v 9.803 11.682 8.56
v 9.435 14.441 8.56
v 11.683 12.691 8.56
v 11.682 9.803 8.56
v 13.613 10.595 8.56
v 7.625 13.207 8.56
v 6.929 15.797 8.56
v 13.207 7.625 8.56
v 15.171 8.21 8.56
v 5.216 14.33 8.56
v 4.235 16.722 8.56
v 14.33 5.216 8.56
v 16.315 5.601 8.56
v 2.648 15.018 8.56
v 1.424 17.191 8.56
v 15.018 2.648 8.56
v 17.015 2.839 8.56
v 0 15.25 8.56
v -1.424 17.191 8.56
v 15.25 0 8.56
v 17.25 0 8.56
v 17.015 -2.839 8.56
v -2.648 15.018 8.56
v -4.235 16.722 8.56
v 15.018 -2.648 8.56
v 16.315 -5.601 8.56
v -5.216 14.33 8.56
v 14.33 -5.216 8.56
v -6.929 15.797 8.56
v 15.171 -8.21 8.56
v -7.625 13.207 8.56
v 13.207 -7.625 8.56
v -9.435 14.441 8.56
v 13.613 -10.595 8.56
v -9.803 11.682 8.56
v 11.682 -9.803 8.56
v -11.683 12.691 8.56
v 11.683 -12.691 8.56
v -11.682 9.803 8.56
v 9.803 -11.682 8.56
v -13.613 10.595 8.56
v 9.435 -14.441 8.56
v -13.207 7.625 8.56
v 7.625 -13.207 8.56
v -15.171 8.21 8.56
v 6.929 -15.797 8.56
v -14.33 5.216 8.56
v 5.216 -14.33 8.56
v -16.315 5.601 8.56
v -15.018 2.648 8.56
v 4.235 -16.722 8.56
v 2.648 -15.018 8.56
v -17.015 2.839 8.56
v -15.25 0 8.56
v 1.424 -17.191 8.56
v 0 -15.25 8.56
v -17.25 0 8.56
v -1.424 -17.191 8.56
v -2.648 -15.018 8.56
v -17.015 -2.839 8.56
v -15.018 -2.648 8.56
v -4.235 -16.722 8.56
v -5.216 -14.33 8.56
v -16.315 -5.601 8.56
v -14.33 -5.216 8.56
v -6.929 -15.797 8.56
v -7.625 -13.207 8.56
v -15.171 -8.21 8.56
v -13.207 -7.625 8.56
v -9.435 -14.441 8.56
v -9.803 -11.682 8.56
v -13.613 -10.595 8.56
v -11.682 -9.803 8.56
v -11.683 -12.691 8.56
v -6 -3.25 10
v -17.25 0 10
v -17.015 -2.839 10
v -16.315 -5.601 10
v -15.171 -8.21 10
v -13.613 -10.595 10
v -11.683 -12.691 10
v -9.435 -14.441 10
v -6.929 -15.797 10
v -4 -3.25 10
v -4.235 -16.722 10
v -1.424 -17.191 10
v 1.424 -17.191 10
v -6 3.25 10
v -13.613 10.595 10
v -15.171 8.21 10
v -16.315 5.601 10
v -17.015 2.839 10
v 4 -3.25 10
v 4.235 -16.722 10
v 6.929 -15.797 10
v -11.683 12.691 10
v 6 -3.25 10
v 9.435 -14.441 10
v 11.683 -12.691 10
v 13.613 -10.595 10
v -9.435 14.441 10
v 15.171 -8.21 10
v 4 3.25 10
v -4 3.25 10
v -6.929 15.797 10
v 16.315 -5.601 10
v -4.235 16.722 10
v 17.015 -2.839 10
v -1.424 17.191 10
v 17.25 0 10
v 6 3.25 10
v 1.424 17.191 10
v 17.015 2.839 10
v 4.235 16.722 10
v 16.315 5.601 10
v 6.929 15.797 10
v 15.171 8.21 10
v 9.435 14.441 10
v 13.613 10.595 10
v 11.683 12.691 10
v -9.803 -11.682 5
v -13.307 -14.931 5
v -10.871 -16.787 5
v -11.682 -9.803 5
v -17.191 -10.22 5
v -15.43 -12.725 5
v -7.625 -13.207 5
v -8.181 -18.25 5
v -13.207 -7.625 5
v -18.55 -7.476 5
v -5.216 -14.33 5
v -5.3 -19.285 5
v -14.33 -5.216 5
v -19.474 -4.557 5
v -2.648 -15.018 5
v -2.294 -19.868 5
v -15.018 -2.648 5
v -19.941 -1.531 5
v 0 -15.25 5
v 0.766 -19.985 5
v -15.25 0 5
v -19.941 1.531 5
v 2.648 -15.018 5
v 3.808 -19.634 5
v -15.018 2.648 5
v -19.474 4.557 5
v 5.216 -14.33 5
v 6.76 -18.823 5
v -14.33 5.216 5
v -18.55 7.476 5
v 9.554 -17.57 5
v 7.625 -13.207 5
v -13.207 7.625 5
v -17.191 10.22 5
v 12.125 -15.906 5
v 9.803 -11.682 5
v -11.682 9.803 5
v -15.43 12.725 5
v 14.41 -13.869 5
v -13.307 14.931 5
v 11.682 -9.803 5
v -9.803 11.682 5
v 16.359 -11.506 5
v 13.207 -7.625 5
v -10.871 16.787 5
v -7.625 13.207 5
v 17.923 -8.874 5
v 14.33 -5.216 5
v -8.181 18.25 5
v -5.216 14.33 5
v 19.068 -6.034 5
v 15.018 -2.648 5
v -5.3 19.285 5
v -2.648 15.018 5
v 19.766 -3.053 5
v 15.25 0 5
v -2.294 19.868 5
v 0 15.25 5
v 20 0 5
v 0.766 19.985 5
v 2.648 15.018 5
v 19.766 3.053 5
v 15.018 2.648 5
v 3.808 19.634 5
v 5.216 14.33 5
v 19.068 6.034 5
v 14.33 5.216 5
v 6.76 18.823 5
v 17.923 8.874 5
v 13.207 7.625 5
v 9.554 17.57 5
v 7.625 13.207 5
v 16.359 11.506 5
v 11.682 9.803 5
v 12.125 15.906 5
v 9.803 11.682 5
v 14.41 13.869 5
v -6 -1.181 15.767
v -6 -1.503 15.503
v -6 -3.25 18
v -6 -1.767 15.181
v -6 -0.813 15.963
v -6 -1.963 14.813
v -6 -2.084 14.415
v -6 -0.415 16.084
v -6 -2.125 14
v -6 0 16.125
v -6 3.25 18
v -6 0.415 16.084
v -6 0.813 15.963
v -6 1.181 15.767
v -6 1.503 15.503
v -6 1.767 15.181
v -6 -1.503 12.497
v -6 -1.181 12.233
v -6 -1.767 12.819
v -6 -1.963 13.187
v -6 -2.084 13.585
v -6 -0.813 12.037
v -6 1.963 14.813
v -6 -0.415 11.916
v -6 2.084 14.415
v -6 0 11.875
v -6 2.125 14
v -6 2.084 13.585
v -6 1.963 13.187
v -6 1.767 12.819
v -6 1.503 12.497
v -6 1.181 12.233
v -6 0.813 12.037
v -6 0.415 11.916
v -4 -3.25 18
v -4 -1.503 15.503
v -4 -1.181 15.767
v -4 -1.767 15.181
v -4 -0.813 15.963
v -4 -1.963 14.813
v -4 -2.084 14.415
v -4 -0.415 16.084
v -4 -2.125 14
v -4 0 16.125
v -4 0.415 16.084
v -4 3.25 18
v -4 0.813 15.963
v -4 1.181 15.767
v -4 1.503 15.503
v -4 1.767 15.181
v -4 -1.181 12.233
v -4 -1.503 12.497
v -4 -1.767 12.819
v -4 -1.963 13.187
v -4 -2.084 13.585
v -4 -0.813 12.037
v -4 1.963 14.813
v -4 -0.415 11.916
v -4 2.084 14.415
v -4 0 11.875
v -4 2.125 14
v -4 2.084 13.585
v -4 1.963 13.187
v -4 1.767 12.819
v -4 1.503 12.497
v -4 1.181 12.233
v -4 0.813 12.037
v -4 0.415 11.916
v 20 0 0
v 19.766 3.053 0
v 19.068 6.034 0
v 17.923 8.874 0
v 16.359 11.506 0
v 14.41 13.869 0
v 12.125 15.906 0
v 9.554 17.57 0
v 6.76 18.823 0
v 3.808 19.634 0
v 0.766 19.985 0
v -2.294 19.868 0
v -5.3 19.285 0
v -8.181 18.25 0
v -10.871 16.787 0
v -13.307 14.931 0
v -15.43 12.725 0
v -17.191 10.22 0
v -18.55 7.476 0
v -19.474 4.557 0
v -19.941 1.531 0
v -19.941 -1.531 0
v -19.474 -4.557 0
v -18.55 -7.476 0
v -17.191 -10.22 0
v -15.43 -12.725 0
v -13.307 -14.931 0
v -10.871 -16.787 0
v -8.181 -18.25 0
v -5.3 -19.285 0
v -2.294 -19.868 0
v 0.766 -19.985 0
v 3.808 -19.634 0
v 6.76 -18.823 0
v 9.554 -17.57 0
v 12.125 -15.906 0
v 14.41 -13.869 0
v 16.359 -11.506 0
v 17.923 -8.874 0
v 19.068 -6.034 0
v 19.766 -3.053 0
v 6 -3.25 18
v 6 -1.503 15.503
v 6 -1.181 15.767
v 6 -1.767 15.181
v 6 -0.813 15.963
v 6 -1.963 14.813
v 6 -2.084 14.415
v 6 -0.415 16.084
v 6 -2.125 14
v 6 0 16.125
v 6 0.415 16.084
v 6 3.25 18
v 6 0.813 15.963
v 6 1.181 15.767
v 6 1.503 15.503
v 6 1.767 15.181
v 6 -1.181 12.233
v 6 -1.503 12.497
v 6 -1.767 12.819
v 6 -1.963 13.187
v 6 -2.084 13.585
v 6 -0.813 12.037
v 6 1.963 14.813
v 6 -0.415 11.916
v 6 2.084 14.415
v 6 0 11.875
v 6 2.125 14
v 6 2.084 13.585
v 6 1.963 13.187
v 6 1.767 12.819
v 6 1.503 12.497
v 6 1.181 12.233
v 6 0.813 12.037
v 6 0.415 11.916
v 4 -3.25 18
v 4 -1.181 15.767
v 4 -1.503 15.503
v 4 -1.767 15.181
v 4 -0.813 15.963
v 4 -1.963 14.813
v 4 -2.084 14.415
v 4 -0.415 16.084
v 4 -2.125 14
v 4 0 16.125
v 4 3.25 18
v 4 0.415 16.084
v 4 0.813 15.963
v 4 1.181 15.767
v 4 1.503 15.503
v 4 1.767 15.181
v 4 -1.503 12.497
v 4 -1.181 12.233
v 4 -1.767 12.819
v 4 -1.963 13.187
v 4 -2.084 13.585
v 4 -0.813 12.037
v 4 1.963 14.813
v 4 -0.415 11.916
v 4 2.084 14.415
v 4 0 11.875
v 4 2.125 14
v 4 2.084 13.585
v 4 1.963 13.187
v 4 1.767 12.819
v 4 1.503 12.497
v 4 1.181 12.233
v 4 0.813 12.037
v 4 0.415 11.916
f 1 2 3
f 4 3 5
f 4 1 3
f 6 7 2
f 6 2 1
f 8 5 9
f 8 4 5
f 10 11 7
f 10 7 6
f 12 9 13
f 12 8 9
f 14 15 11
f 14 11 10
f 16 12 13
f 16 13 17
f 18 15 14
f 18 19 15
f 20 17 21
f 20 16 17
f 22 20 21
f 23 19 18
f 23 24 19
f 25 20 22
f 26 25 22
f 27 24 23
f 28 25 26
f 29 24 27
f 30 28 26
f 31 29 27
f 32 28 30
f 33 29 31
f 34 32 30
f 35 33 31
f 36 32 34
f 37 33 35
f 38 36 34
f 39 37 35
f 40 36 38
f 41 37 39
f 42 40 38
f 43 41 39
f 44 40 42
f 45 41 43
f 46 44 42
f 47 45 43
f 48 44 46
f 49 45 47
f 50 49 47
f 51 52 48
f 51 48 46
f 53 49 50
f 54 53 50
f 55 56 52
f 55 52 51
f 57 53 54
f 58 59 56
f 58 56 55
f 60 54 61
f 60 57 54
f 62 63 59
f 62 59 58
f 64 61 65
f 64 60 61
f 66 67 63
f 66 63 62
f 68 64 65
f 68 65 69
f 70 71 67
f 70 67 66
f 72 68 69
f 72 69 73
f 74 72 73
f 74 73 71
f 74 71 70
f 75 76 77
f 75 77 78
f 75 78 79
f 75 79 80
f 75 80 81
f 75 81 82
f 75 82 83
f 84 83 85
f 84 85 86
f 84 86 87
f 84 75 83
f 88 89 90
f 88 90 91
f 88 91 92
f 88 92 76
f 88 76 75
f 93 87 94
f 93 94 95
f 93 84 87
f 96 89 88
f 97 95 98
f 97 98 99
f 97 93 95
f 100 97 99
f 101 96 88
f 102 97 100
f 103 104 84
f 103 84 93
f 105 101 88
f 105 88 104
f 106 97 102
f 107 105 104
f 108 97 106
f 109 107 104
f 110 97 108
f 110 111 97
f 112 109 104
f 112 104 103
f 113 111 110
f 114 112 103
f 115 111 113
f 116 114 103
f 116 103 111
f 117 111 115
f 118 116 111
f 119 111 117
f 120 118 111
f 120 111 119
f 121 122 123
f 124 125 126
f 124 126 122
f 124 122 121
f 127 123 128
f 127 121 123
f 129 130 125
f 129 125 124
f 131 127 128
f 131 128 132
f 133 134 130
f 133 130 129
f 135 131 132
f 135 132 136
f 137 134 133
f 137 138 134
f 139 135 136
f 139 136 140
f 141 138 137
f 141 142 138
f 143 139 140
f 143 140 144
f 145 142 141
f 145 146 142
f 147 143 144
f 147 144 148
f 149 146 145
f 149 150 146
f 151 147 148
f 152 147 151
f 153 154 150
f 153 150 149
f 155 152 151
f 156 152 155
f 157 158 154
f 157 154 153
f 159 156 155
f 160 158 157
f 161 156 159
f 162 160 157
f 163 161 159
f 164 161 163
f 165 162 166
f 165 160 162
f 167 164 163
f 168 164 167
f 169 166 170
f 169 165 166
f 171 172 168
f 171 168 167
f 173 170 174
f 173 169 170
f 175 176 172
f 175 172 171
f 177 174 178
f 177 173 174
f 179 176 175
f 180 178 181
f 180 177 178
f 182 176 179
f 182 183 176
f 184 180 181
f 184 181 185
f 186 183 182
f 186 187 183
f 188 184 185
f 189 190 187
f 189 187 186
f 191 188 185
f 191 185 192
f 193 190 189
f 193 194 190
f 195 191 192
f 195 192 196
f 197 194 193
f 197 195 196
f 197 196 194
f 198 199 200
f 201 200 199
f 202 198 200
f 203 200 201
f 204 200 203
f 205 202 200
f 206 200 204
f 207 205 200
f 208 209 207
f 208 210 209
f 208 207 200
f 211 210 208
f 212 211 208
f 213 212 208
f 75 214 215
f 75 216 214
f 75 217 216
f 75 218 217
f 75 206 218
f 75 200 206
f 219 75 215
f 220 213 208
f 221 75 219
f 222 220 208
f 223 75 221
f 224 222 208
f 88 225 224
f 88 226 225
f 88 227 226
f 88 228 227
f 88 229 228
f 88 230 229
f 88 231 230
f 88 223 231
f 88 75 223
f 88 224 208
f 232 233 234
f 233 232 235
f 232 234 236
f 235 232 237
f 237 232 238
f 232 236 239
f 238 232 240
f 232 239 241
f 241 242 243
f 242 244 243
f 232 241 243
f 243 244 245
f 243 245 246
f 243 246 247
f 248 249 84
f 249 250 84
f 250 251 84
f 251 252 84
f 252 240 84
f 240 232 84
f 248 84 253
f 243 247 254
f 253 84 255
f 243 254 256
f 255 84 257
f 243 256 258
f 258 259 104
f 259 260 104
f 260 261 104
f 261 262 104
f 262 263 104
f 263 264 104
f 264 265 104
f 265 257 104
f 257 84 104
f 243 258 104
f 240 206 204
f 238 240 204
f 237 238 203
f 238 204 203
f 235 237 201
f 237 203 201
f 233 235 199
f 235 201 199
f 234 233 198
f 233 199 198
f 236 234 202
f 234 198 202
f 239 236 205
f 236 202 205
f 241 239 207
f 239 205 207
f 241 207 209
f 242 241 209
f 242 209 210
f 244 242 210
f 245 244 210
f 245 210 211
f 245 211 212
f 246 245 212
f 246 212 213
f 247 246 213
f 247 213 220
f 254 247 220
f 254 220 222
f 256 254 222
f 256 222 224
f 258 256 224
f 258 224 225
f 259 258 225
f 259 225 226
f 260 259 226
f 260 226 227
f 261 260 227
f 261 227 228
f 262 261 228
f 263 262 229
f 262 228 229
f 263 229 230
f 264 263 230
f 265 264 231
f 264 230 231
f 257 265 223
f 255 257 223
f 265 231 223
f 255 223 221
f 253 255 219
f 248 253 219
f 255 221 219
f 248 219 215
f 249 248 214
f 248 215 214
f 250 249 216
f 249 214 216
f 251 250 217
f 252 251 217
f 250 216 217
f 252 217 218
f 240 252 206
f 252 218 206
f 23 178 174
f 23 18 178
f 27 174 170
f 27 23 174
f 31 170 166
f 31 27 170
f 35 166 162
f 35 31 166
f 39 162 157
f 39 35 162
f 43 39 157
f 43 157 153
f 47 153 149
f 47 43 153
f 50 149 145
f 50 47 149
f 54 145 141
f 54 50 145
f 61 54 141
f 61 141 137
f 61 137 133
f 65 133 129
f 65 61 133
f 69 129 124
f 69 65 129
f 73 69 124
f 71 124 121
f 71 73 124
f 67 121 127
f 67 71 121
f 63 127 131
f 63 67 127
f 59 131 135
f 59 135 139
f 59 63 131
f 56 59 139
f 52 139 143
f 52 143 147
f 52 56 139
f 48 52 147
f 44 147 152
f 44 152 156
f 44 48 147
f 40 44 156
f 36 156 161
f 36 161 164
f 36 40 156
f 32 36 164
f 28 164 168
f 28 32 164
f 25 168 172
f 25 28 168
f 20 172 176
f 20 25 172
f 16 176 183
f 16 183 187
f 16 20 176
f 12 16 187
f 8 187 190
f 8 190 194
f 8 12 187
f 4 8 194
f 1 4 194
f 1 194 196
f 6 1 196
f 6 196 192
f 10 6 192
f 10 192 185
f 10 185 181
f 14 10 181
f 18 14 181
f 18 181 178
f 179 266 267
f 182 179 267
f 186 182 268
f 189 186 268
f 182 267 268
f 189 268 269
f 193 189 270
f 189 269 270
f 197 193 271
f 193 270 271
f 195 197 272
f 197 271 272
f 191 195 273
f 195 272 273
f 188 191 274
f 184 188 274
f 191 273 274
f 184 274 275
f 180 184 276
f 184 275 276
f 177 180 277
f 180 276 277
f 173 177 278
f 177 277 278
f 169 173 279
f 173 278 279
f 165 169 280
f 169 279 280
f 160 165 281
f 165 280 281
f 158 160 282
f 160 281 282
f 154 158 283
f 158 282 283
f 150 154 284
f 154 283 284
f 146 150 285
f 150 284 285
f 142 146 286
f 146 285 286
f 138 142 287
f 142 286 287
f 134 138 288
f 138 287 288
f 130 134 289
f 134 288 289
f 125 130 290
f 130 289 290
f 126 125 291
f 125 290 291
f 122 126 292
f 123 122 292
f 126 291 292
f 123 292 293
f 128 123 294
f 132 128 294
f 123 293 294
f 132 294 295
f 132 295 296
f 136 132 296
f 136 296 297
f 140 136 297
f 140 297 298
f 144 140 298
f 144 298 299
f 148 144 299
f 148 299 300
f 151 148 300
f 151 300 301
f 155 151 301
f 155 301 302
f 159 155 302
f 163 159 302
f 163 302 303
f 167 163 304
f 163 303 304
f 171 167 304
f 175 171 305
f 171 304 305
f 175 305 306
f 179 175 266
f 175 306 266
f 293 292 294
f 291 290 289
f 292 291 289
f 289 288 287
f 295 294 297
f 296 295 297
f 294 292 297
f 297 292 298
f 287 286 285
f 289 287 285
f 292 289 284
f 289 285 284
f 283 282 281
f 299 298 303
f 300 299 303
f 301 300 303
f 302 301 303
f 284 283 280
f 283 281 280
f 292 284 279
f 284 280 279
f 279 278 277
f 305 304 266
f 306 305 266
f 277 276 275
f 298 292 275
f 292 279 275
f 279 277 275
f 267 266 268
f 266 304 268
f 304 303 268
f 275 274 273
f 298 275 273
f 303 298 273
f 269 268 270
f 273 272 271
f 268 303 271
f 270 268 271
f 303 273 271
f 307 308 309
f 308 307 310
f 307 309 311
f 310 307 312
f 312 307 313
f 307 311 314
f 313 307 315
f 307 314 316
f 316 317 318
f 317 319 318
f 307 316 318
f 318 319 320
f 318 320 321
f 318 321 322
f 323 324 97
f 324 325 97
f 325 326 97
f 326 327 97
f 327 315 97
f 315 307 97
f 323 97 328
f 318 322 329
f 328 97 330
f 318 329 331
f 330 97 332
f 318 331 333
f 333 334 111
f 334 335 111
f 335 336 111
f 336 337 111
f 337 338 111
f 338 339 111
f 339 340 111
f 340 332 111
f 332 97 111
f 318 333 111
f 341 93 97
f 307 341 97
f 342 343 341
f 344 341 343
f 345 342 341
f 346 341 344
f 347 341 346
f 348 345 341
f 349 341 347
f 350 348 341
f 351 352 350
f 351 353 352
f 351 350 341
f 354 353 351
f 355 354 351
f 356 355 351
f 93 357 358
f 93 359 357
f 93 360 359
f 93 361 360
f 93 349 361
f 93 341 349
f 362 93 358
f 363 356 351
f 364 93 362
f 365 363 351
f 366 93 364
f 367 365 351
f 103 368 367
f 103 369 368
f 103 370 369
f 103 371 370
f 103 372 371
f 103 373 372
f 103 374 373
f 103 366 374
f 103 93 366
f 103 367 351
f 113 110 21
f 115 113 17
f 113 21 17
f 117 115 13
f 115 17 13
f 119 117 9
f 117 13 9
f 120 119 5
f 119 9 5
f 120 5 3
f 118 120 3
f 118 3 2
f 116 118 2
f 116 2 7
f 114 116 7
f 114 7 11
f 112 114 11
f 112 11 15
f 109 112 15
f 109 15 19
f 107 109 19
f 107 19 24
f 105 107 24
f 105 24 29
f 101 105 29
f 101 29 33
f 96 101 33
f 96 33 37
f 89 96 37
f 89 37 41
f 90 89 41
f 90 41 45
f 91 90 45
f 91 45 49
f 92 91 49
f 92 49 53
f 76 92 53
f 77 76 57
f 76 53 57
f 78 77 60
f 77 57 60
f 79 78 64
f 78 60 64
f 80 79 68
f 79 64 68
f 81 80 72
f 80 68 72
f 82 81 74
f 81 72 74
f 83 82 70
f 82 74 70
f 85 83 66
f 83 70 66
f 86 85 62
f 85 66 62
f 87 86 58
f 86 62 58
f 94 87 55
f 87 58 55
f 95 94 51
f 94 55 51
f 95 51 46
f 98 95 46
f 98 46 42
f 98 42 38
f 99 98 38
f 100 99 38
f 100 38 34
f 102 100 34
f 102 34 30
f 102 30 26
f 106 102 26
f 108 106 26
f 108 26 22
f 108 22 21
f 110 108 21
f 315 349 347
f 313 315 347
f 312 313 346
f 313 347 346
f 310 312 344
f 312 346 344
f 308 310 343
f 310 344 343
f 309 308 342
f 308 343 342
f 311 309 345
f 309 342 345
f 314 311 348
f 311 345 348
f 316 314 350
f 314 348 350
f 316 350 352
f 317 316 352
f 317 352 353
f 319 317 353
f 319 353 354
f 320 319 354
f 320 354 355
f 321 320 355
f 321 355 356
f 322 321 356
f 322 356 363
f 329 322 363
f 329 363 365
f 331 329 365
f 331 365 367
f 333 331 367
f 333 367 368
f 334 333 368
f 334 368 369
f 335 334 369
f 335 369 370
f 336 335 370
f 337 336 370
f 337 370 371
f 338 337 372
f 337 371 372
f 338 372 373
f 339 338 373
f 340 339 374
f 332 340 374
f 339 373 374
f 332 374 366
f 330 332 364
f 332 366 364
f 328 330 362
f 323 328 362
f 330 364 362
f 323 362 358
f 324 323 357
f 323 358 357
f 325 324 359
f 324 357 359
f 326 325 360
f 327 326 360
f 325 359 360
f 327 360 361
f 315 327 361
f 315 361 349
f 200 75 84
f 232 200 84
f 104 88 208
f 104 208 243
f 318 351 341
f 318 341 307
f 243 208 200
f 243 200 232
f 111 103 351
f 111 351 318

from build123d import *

# Parameters (mm, degrees)
F0_R      = 20
F1_DEPTH  = 5
F2_R      = 17.25
F3_DEPTH  = 10
F4_W      = 2
F4_H      = 3.56
F7_W      = 2
F7_H      = 6.5
F8_DEPTH  = 8
F9_R      = 2.125
F10_DEPTH = 26.001


with BuildPart() as f1:
    # F0 (on Top) → F1 (new body)
    with BuildSketch(Plane.XY):
        Circle(F0_R)
    extrude(amount=F1_DEPTH)

    # F2 (on Top) → F3 (join)
    with BuildSketch(Plane.XY):
        Circle(F2_R)
    extrude(amount=F3_DEPTH)

    # F4 (on Right) → F6 (revolve, cut)
    with BuildSketch(Plane.YZ):
        with Locations((16.25, 6.78)):
            Rectangle(F4_W, F4_H)
    revolve(axis=Axis((0, 0, 6.819869), (0, 0, 1)), mode=Mode.SUBTRACT)

    # F7 (on face) → F8 (join)
    with BuildSketch(Plane.XY.offset(10)):
        with Locations((5, 0)):
            Rectangle(F7_W, F7_H)
        with Locations((-5, 0)):
            Rectangle(F7_W, F7_H)
    extrude(amount=F8_DEPTH)

    # F9 (on face) → F10 (cut, through all)
    with BuildSketch(Plane(origin=(-6, 0, 0), x_dir=(0, -1, 0), z_dir=(-1, 0, 0))):
        with Locations((0, 14)):
            Circle(F9_R)
    extrude(amount=-F10_DEPTH, mode=Mode.SUBTRACT)


solid = f1.part
